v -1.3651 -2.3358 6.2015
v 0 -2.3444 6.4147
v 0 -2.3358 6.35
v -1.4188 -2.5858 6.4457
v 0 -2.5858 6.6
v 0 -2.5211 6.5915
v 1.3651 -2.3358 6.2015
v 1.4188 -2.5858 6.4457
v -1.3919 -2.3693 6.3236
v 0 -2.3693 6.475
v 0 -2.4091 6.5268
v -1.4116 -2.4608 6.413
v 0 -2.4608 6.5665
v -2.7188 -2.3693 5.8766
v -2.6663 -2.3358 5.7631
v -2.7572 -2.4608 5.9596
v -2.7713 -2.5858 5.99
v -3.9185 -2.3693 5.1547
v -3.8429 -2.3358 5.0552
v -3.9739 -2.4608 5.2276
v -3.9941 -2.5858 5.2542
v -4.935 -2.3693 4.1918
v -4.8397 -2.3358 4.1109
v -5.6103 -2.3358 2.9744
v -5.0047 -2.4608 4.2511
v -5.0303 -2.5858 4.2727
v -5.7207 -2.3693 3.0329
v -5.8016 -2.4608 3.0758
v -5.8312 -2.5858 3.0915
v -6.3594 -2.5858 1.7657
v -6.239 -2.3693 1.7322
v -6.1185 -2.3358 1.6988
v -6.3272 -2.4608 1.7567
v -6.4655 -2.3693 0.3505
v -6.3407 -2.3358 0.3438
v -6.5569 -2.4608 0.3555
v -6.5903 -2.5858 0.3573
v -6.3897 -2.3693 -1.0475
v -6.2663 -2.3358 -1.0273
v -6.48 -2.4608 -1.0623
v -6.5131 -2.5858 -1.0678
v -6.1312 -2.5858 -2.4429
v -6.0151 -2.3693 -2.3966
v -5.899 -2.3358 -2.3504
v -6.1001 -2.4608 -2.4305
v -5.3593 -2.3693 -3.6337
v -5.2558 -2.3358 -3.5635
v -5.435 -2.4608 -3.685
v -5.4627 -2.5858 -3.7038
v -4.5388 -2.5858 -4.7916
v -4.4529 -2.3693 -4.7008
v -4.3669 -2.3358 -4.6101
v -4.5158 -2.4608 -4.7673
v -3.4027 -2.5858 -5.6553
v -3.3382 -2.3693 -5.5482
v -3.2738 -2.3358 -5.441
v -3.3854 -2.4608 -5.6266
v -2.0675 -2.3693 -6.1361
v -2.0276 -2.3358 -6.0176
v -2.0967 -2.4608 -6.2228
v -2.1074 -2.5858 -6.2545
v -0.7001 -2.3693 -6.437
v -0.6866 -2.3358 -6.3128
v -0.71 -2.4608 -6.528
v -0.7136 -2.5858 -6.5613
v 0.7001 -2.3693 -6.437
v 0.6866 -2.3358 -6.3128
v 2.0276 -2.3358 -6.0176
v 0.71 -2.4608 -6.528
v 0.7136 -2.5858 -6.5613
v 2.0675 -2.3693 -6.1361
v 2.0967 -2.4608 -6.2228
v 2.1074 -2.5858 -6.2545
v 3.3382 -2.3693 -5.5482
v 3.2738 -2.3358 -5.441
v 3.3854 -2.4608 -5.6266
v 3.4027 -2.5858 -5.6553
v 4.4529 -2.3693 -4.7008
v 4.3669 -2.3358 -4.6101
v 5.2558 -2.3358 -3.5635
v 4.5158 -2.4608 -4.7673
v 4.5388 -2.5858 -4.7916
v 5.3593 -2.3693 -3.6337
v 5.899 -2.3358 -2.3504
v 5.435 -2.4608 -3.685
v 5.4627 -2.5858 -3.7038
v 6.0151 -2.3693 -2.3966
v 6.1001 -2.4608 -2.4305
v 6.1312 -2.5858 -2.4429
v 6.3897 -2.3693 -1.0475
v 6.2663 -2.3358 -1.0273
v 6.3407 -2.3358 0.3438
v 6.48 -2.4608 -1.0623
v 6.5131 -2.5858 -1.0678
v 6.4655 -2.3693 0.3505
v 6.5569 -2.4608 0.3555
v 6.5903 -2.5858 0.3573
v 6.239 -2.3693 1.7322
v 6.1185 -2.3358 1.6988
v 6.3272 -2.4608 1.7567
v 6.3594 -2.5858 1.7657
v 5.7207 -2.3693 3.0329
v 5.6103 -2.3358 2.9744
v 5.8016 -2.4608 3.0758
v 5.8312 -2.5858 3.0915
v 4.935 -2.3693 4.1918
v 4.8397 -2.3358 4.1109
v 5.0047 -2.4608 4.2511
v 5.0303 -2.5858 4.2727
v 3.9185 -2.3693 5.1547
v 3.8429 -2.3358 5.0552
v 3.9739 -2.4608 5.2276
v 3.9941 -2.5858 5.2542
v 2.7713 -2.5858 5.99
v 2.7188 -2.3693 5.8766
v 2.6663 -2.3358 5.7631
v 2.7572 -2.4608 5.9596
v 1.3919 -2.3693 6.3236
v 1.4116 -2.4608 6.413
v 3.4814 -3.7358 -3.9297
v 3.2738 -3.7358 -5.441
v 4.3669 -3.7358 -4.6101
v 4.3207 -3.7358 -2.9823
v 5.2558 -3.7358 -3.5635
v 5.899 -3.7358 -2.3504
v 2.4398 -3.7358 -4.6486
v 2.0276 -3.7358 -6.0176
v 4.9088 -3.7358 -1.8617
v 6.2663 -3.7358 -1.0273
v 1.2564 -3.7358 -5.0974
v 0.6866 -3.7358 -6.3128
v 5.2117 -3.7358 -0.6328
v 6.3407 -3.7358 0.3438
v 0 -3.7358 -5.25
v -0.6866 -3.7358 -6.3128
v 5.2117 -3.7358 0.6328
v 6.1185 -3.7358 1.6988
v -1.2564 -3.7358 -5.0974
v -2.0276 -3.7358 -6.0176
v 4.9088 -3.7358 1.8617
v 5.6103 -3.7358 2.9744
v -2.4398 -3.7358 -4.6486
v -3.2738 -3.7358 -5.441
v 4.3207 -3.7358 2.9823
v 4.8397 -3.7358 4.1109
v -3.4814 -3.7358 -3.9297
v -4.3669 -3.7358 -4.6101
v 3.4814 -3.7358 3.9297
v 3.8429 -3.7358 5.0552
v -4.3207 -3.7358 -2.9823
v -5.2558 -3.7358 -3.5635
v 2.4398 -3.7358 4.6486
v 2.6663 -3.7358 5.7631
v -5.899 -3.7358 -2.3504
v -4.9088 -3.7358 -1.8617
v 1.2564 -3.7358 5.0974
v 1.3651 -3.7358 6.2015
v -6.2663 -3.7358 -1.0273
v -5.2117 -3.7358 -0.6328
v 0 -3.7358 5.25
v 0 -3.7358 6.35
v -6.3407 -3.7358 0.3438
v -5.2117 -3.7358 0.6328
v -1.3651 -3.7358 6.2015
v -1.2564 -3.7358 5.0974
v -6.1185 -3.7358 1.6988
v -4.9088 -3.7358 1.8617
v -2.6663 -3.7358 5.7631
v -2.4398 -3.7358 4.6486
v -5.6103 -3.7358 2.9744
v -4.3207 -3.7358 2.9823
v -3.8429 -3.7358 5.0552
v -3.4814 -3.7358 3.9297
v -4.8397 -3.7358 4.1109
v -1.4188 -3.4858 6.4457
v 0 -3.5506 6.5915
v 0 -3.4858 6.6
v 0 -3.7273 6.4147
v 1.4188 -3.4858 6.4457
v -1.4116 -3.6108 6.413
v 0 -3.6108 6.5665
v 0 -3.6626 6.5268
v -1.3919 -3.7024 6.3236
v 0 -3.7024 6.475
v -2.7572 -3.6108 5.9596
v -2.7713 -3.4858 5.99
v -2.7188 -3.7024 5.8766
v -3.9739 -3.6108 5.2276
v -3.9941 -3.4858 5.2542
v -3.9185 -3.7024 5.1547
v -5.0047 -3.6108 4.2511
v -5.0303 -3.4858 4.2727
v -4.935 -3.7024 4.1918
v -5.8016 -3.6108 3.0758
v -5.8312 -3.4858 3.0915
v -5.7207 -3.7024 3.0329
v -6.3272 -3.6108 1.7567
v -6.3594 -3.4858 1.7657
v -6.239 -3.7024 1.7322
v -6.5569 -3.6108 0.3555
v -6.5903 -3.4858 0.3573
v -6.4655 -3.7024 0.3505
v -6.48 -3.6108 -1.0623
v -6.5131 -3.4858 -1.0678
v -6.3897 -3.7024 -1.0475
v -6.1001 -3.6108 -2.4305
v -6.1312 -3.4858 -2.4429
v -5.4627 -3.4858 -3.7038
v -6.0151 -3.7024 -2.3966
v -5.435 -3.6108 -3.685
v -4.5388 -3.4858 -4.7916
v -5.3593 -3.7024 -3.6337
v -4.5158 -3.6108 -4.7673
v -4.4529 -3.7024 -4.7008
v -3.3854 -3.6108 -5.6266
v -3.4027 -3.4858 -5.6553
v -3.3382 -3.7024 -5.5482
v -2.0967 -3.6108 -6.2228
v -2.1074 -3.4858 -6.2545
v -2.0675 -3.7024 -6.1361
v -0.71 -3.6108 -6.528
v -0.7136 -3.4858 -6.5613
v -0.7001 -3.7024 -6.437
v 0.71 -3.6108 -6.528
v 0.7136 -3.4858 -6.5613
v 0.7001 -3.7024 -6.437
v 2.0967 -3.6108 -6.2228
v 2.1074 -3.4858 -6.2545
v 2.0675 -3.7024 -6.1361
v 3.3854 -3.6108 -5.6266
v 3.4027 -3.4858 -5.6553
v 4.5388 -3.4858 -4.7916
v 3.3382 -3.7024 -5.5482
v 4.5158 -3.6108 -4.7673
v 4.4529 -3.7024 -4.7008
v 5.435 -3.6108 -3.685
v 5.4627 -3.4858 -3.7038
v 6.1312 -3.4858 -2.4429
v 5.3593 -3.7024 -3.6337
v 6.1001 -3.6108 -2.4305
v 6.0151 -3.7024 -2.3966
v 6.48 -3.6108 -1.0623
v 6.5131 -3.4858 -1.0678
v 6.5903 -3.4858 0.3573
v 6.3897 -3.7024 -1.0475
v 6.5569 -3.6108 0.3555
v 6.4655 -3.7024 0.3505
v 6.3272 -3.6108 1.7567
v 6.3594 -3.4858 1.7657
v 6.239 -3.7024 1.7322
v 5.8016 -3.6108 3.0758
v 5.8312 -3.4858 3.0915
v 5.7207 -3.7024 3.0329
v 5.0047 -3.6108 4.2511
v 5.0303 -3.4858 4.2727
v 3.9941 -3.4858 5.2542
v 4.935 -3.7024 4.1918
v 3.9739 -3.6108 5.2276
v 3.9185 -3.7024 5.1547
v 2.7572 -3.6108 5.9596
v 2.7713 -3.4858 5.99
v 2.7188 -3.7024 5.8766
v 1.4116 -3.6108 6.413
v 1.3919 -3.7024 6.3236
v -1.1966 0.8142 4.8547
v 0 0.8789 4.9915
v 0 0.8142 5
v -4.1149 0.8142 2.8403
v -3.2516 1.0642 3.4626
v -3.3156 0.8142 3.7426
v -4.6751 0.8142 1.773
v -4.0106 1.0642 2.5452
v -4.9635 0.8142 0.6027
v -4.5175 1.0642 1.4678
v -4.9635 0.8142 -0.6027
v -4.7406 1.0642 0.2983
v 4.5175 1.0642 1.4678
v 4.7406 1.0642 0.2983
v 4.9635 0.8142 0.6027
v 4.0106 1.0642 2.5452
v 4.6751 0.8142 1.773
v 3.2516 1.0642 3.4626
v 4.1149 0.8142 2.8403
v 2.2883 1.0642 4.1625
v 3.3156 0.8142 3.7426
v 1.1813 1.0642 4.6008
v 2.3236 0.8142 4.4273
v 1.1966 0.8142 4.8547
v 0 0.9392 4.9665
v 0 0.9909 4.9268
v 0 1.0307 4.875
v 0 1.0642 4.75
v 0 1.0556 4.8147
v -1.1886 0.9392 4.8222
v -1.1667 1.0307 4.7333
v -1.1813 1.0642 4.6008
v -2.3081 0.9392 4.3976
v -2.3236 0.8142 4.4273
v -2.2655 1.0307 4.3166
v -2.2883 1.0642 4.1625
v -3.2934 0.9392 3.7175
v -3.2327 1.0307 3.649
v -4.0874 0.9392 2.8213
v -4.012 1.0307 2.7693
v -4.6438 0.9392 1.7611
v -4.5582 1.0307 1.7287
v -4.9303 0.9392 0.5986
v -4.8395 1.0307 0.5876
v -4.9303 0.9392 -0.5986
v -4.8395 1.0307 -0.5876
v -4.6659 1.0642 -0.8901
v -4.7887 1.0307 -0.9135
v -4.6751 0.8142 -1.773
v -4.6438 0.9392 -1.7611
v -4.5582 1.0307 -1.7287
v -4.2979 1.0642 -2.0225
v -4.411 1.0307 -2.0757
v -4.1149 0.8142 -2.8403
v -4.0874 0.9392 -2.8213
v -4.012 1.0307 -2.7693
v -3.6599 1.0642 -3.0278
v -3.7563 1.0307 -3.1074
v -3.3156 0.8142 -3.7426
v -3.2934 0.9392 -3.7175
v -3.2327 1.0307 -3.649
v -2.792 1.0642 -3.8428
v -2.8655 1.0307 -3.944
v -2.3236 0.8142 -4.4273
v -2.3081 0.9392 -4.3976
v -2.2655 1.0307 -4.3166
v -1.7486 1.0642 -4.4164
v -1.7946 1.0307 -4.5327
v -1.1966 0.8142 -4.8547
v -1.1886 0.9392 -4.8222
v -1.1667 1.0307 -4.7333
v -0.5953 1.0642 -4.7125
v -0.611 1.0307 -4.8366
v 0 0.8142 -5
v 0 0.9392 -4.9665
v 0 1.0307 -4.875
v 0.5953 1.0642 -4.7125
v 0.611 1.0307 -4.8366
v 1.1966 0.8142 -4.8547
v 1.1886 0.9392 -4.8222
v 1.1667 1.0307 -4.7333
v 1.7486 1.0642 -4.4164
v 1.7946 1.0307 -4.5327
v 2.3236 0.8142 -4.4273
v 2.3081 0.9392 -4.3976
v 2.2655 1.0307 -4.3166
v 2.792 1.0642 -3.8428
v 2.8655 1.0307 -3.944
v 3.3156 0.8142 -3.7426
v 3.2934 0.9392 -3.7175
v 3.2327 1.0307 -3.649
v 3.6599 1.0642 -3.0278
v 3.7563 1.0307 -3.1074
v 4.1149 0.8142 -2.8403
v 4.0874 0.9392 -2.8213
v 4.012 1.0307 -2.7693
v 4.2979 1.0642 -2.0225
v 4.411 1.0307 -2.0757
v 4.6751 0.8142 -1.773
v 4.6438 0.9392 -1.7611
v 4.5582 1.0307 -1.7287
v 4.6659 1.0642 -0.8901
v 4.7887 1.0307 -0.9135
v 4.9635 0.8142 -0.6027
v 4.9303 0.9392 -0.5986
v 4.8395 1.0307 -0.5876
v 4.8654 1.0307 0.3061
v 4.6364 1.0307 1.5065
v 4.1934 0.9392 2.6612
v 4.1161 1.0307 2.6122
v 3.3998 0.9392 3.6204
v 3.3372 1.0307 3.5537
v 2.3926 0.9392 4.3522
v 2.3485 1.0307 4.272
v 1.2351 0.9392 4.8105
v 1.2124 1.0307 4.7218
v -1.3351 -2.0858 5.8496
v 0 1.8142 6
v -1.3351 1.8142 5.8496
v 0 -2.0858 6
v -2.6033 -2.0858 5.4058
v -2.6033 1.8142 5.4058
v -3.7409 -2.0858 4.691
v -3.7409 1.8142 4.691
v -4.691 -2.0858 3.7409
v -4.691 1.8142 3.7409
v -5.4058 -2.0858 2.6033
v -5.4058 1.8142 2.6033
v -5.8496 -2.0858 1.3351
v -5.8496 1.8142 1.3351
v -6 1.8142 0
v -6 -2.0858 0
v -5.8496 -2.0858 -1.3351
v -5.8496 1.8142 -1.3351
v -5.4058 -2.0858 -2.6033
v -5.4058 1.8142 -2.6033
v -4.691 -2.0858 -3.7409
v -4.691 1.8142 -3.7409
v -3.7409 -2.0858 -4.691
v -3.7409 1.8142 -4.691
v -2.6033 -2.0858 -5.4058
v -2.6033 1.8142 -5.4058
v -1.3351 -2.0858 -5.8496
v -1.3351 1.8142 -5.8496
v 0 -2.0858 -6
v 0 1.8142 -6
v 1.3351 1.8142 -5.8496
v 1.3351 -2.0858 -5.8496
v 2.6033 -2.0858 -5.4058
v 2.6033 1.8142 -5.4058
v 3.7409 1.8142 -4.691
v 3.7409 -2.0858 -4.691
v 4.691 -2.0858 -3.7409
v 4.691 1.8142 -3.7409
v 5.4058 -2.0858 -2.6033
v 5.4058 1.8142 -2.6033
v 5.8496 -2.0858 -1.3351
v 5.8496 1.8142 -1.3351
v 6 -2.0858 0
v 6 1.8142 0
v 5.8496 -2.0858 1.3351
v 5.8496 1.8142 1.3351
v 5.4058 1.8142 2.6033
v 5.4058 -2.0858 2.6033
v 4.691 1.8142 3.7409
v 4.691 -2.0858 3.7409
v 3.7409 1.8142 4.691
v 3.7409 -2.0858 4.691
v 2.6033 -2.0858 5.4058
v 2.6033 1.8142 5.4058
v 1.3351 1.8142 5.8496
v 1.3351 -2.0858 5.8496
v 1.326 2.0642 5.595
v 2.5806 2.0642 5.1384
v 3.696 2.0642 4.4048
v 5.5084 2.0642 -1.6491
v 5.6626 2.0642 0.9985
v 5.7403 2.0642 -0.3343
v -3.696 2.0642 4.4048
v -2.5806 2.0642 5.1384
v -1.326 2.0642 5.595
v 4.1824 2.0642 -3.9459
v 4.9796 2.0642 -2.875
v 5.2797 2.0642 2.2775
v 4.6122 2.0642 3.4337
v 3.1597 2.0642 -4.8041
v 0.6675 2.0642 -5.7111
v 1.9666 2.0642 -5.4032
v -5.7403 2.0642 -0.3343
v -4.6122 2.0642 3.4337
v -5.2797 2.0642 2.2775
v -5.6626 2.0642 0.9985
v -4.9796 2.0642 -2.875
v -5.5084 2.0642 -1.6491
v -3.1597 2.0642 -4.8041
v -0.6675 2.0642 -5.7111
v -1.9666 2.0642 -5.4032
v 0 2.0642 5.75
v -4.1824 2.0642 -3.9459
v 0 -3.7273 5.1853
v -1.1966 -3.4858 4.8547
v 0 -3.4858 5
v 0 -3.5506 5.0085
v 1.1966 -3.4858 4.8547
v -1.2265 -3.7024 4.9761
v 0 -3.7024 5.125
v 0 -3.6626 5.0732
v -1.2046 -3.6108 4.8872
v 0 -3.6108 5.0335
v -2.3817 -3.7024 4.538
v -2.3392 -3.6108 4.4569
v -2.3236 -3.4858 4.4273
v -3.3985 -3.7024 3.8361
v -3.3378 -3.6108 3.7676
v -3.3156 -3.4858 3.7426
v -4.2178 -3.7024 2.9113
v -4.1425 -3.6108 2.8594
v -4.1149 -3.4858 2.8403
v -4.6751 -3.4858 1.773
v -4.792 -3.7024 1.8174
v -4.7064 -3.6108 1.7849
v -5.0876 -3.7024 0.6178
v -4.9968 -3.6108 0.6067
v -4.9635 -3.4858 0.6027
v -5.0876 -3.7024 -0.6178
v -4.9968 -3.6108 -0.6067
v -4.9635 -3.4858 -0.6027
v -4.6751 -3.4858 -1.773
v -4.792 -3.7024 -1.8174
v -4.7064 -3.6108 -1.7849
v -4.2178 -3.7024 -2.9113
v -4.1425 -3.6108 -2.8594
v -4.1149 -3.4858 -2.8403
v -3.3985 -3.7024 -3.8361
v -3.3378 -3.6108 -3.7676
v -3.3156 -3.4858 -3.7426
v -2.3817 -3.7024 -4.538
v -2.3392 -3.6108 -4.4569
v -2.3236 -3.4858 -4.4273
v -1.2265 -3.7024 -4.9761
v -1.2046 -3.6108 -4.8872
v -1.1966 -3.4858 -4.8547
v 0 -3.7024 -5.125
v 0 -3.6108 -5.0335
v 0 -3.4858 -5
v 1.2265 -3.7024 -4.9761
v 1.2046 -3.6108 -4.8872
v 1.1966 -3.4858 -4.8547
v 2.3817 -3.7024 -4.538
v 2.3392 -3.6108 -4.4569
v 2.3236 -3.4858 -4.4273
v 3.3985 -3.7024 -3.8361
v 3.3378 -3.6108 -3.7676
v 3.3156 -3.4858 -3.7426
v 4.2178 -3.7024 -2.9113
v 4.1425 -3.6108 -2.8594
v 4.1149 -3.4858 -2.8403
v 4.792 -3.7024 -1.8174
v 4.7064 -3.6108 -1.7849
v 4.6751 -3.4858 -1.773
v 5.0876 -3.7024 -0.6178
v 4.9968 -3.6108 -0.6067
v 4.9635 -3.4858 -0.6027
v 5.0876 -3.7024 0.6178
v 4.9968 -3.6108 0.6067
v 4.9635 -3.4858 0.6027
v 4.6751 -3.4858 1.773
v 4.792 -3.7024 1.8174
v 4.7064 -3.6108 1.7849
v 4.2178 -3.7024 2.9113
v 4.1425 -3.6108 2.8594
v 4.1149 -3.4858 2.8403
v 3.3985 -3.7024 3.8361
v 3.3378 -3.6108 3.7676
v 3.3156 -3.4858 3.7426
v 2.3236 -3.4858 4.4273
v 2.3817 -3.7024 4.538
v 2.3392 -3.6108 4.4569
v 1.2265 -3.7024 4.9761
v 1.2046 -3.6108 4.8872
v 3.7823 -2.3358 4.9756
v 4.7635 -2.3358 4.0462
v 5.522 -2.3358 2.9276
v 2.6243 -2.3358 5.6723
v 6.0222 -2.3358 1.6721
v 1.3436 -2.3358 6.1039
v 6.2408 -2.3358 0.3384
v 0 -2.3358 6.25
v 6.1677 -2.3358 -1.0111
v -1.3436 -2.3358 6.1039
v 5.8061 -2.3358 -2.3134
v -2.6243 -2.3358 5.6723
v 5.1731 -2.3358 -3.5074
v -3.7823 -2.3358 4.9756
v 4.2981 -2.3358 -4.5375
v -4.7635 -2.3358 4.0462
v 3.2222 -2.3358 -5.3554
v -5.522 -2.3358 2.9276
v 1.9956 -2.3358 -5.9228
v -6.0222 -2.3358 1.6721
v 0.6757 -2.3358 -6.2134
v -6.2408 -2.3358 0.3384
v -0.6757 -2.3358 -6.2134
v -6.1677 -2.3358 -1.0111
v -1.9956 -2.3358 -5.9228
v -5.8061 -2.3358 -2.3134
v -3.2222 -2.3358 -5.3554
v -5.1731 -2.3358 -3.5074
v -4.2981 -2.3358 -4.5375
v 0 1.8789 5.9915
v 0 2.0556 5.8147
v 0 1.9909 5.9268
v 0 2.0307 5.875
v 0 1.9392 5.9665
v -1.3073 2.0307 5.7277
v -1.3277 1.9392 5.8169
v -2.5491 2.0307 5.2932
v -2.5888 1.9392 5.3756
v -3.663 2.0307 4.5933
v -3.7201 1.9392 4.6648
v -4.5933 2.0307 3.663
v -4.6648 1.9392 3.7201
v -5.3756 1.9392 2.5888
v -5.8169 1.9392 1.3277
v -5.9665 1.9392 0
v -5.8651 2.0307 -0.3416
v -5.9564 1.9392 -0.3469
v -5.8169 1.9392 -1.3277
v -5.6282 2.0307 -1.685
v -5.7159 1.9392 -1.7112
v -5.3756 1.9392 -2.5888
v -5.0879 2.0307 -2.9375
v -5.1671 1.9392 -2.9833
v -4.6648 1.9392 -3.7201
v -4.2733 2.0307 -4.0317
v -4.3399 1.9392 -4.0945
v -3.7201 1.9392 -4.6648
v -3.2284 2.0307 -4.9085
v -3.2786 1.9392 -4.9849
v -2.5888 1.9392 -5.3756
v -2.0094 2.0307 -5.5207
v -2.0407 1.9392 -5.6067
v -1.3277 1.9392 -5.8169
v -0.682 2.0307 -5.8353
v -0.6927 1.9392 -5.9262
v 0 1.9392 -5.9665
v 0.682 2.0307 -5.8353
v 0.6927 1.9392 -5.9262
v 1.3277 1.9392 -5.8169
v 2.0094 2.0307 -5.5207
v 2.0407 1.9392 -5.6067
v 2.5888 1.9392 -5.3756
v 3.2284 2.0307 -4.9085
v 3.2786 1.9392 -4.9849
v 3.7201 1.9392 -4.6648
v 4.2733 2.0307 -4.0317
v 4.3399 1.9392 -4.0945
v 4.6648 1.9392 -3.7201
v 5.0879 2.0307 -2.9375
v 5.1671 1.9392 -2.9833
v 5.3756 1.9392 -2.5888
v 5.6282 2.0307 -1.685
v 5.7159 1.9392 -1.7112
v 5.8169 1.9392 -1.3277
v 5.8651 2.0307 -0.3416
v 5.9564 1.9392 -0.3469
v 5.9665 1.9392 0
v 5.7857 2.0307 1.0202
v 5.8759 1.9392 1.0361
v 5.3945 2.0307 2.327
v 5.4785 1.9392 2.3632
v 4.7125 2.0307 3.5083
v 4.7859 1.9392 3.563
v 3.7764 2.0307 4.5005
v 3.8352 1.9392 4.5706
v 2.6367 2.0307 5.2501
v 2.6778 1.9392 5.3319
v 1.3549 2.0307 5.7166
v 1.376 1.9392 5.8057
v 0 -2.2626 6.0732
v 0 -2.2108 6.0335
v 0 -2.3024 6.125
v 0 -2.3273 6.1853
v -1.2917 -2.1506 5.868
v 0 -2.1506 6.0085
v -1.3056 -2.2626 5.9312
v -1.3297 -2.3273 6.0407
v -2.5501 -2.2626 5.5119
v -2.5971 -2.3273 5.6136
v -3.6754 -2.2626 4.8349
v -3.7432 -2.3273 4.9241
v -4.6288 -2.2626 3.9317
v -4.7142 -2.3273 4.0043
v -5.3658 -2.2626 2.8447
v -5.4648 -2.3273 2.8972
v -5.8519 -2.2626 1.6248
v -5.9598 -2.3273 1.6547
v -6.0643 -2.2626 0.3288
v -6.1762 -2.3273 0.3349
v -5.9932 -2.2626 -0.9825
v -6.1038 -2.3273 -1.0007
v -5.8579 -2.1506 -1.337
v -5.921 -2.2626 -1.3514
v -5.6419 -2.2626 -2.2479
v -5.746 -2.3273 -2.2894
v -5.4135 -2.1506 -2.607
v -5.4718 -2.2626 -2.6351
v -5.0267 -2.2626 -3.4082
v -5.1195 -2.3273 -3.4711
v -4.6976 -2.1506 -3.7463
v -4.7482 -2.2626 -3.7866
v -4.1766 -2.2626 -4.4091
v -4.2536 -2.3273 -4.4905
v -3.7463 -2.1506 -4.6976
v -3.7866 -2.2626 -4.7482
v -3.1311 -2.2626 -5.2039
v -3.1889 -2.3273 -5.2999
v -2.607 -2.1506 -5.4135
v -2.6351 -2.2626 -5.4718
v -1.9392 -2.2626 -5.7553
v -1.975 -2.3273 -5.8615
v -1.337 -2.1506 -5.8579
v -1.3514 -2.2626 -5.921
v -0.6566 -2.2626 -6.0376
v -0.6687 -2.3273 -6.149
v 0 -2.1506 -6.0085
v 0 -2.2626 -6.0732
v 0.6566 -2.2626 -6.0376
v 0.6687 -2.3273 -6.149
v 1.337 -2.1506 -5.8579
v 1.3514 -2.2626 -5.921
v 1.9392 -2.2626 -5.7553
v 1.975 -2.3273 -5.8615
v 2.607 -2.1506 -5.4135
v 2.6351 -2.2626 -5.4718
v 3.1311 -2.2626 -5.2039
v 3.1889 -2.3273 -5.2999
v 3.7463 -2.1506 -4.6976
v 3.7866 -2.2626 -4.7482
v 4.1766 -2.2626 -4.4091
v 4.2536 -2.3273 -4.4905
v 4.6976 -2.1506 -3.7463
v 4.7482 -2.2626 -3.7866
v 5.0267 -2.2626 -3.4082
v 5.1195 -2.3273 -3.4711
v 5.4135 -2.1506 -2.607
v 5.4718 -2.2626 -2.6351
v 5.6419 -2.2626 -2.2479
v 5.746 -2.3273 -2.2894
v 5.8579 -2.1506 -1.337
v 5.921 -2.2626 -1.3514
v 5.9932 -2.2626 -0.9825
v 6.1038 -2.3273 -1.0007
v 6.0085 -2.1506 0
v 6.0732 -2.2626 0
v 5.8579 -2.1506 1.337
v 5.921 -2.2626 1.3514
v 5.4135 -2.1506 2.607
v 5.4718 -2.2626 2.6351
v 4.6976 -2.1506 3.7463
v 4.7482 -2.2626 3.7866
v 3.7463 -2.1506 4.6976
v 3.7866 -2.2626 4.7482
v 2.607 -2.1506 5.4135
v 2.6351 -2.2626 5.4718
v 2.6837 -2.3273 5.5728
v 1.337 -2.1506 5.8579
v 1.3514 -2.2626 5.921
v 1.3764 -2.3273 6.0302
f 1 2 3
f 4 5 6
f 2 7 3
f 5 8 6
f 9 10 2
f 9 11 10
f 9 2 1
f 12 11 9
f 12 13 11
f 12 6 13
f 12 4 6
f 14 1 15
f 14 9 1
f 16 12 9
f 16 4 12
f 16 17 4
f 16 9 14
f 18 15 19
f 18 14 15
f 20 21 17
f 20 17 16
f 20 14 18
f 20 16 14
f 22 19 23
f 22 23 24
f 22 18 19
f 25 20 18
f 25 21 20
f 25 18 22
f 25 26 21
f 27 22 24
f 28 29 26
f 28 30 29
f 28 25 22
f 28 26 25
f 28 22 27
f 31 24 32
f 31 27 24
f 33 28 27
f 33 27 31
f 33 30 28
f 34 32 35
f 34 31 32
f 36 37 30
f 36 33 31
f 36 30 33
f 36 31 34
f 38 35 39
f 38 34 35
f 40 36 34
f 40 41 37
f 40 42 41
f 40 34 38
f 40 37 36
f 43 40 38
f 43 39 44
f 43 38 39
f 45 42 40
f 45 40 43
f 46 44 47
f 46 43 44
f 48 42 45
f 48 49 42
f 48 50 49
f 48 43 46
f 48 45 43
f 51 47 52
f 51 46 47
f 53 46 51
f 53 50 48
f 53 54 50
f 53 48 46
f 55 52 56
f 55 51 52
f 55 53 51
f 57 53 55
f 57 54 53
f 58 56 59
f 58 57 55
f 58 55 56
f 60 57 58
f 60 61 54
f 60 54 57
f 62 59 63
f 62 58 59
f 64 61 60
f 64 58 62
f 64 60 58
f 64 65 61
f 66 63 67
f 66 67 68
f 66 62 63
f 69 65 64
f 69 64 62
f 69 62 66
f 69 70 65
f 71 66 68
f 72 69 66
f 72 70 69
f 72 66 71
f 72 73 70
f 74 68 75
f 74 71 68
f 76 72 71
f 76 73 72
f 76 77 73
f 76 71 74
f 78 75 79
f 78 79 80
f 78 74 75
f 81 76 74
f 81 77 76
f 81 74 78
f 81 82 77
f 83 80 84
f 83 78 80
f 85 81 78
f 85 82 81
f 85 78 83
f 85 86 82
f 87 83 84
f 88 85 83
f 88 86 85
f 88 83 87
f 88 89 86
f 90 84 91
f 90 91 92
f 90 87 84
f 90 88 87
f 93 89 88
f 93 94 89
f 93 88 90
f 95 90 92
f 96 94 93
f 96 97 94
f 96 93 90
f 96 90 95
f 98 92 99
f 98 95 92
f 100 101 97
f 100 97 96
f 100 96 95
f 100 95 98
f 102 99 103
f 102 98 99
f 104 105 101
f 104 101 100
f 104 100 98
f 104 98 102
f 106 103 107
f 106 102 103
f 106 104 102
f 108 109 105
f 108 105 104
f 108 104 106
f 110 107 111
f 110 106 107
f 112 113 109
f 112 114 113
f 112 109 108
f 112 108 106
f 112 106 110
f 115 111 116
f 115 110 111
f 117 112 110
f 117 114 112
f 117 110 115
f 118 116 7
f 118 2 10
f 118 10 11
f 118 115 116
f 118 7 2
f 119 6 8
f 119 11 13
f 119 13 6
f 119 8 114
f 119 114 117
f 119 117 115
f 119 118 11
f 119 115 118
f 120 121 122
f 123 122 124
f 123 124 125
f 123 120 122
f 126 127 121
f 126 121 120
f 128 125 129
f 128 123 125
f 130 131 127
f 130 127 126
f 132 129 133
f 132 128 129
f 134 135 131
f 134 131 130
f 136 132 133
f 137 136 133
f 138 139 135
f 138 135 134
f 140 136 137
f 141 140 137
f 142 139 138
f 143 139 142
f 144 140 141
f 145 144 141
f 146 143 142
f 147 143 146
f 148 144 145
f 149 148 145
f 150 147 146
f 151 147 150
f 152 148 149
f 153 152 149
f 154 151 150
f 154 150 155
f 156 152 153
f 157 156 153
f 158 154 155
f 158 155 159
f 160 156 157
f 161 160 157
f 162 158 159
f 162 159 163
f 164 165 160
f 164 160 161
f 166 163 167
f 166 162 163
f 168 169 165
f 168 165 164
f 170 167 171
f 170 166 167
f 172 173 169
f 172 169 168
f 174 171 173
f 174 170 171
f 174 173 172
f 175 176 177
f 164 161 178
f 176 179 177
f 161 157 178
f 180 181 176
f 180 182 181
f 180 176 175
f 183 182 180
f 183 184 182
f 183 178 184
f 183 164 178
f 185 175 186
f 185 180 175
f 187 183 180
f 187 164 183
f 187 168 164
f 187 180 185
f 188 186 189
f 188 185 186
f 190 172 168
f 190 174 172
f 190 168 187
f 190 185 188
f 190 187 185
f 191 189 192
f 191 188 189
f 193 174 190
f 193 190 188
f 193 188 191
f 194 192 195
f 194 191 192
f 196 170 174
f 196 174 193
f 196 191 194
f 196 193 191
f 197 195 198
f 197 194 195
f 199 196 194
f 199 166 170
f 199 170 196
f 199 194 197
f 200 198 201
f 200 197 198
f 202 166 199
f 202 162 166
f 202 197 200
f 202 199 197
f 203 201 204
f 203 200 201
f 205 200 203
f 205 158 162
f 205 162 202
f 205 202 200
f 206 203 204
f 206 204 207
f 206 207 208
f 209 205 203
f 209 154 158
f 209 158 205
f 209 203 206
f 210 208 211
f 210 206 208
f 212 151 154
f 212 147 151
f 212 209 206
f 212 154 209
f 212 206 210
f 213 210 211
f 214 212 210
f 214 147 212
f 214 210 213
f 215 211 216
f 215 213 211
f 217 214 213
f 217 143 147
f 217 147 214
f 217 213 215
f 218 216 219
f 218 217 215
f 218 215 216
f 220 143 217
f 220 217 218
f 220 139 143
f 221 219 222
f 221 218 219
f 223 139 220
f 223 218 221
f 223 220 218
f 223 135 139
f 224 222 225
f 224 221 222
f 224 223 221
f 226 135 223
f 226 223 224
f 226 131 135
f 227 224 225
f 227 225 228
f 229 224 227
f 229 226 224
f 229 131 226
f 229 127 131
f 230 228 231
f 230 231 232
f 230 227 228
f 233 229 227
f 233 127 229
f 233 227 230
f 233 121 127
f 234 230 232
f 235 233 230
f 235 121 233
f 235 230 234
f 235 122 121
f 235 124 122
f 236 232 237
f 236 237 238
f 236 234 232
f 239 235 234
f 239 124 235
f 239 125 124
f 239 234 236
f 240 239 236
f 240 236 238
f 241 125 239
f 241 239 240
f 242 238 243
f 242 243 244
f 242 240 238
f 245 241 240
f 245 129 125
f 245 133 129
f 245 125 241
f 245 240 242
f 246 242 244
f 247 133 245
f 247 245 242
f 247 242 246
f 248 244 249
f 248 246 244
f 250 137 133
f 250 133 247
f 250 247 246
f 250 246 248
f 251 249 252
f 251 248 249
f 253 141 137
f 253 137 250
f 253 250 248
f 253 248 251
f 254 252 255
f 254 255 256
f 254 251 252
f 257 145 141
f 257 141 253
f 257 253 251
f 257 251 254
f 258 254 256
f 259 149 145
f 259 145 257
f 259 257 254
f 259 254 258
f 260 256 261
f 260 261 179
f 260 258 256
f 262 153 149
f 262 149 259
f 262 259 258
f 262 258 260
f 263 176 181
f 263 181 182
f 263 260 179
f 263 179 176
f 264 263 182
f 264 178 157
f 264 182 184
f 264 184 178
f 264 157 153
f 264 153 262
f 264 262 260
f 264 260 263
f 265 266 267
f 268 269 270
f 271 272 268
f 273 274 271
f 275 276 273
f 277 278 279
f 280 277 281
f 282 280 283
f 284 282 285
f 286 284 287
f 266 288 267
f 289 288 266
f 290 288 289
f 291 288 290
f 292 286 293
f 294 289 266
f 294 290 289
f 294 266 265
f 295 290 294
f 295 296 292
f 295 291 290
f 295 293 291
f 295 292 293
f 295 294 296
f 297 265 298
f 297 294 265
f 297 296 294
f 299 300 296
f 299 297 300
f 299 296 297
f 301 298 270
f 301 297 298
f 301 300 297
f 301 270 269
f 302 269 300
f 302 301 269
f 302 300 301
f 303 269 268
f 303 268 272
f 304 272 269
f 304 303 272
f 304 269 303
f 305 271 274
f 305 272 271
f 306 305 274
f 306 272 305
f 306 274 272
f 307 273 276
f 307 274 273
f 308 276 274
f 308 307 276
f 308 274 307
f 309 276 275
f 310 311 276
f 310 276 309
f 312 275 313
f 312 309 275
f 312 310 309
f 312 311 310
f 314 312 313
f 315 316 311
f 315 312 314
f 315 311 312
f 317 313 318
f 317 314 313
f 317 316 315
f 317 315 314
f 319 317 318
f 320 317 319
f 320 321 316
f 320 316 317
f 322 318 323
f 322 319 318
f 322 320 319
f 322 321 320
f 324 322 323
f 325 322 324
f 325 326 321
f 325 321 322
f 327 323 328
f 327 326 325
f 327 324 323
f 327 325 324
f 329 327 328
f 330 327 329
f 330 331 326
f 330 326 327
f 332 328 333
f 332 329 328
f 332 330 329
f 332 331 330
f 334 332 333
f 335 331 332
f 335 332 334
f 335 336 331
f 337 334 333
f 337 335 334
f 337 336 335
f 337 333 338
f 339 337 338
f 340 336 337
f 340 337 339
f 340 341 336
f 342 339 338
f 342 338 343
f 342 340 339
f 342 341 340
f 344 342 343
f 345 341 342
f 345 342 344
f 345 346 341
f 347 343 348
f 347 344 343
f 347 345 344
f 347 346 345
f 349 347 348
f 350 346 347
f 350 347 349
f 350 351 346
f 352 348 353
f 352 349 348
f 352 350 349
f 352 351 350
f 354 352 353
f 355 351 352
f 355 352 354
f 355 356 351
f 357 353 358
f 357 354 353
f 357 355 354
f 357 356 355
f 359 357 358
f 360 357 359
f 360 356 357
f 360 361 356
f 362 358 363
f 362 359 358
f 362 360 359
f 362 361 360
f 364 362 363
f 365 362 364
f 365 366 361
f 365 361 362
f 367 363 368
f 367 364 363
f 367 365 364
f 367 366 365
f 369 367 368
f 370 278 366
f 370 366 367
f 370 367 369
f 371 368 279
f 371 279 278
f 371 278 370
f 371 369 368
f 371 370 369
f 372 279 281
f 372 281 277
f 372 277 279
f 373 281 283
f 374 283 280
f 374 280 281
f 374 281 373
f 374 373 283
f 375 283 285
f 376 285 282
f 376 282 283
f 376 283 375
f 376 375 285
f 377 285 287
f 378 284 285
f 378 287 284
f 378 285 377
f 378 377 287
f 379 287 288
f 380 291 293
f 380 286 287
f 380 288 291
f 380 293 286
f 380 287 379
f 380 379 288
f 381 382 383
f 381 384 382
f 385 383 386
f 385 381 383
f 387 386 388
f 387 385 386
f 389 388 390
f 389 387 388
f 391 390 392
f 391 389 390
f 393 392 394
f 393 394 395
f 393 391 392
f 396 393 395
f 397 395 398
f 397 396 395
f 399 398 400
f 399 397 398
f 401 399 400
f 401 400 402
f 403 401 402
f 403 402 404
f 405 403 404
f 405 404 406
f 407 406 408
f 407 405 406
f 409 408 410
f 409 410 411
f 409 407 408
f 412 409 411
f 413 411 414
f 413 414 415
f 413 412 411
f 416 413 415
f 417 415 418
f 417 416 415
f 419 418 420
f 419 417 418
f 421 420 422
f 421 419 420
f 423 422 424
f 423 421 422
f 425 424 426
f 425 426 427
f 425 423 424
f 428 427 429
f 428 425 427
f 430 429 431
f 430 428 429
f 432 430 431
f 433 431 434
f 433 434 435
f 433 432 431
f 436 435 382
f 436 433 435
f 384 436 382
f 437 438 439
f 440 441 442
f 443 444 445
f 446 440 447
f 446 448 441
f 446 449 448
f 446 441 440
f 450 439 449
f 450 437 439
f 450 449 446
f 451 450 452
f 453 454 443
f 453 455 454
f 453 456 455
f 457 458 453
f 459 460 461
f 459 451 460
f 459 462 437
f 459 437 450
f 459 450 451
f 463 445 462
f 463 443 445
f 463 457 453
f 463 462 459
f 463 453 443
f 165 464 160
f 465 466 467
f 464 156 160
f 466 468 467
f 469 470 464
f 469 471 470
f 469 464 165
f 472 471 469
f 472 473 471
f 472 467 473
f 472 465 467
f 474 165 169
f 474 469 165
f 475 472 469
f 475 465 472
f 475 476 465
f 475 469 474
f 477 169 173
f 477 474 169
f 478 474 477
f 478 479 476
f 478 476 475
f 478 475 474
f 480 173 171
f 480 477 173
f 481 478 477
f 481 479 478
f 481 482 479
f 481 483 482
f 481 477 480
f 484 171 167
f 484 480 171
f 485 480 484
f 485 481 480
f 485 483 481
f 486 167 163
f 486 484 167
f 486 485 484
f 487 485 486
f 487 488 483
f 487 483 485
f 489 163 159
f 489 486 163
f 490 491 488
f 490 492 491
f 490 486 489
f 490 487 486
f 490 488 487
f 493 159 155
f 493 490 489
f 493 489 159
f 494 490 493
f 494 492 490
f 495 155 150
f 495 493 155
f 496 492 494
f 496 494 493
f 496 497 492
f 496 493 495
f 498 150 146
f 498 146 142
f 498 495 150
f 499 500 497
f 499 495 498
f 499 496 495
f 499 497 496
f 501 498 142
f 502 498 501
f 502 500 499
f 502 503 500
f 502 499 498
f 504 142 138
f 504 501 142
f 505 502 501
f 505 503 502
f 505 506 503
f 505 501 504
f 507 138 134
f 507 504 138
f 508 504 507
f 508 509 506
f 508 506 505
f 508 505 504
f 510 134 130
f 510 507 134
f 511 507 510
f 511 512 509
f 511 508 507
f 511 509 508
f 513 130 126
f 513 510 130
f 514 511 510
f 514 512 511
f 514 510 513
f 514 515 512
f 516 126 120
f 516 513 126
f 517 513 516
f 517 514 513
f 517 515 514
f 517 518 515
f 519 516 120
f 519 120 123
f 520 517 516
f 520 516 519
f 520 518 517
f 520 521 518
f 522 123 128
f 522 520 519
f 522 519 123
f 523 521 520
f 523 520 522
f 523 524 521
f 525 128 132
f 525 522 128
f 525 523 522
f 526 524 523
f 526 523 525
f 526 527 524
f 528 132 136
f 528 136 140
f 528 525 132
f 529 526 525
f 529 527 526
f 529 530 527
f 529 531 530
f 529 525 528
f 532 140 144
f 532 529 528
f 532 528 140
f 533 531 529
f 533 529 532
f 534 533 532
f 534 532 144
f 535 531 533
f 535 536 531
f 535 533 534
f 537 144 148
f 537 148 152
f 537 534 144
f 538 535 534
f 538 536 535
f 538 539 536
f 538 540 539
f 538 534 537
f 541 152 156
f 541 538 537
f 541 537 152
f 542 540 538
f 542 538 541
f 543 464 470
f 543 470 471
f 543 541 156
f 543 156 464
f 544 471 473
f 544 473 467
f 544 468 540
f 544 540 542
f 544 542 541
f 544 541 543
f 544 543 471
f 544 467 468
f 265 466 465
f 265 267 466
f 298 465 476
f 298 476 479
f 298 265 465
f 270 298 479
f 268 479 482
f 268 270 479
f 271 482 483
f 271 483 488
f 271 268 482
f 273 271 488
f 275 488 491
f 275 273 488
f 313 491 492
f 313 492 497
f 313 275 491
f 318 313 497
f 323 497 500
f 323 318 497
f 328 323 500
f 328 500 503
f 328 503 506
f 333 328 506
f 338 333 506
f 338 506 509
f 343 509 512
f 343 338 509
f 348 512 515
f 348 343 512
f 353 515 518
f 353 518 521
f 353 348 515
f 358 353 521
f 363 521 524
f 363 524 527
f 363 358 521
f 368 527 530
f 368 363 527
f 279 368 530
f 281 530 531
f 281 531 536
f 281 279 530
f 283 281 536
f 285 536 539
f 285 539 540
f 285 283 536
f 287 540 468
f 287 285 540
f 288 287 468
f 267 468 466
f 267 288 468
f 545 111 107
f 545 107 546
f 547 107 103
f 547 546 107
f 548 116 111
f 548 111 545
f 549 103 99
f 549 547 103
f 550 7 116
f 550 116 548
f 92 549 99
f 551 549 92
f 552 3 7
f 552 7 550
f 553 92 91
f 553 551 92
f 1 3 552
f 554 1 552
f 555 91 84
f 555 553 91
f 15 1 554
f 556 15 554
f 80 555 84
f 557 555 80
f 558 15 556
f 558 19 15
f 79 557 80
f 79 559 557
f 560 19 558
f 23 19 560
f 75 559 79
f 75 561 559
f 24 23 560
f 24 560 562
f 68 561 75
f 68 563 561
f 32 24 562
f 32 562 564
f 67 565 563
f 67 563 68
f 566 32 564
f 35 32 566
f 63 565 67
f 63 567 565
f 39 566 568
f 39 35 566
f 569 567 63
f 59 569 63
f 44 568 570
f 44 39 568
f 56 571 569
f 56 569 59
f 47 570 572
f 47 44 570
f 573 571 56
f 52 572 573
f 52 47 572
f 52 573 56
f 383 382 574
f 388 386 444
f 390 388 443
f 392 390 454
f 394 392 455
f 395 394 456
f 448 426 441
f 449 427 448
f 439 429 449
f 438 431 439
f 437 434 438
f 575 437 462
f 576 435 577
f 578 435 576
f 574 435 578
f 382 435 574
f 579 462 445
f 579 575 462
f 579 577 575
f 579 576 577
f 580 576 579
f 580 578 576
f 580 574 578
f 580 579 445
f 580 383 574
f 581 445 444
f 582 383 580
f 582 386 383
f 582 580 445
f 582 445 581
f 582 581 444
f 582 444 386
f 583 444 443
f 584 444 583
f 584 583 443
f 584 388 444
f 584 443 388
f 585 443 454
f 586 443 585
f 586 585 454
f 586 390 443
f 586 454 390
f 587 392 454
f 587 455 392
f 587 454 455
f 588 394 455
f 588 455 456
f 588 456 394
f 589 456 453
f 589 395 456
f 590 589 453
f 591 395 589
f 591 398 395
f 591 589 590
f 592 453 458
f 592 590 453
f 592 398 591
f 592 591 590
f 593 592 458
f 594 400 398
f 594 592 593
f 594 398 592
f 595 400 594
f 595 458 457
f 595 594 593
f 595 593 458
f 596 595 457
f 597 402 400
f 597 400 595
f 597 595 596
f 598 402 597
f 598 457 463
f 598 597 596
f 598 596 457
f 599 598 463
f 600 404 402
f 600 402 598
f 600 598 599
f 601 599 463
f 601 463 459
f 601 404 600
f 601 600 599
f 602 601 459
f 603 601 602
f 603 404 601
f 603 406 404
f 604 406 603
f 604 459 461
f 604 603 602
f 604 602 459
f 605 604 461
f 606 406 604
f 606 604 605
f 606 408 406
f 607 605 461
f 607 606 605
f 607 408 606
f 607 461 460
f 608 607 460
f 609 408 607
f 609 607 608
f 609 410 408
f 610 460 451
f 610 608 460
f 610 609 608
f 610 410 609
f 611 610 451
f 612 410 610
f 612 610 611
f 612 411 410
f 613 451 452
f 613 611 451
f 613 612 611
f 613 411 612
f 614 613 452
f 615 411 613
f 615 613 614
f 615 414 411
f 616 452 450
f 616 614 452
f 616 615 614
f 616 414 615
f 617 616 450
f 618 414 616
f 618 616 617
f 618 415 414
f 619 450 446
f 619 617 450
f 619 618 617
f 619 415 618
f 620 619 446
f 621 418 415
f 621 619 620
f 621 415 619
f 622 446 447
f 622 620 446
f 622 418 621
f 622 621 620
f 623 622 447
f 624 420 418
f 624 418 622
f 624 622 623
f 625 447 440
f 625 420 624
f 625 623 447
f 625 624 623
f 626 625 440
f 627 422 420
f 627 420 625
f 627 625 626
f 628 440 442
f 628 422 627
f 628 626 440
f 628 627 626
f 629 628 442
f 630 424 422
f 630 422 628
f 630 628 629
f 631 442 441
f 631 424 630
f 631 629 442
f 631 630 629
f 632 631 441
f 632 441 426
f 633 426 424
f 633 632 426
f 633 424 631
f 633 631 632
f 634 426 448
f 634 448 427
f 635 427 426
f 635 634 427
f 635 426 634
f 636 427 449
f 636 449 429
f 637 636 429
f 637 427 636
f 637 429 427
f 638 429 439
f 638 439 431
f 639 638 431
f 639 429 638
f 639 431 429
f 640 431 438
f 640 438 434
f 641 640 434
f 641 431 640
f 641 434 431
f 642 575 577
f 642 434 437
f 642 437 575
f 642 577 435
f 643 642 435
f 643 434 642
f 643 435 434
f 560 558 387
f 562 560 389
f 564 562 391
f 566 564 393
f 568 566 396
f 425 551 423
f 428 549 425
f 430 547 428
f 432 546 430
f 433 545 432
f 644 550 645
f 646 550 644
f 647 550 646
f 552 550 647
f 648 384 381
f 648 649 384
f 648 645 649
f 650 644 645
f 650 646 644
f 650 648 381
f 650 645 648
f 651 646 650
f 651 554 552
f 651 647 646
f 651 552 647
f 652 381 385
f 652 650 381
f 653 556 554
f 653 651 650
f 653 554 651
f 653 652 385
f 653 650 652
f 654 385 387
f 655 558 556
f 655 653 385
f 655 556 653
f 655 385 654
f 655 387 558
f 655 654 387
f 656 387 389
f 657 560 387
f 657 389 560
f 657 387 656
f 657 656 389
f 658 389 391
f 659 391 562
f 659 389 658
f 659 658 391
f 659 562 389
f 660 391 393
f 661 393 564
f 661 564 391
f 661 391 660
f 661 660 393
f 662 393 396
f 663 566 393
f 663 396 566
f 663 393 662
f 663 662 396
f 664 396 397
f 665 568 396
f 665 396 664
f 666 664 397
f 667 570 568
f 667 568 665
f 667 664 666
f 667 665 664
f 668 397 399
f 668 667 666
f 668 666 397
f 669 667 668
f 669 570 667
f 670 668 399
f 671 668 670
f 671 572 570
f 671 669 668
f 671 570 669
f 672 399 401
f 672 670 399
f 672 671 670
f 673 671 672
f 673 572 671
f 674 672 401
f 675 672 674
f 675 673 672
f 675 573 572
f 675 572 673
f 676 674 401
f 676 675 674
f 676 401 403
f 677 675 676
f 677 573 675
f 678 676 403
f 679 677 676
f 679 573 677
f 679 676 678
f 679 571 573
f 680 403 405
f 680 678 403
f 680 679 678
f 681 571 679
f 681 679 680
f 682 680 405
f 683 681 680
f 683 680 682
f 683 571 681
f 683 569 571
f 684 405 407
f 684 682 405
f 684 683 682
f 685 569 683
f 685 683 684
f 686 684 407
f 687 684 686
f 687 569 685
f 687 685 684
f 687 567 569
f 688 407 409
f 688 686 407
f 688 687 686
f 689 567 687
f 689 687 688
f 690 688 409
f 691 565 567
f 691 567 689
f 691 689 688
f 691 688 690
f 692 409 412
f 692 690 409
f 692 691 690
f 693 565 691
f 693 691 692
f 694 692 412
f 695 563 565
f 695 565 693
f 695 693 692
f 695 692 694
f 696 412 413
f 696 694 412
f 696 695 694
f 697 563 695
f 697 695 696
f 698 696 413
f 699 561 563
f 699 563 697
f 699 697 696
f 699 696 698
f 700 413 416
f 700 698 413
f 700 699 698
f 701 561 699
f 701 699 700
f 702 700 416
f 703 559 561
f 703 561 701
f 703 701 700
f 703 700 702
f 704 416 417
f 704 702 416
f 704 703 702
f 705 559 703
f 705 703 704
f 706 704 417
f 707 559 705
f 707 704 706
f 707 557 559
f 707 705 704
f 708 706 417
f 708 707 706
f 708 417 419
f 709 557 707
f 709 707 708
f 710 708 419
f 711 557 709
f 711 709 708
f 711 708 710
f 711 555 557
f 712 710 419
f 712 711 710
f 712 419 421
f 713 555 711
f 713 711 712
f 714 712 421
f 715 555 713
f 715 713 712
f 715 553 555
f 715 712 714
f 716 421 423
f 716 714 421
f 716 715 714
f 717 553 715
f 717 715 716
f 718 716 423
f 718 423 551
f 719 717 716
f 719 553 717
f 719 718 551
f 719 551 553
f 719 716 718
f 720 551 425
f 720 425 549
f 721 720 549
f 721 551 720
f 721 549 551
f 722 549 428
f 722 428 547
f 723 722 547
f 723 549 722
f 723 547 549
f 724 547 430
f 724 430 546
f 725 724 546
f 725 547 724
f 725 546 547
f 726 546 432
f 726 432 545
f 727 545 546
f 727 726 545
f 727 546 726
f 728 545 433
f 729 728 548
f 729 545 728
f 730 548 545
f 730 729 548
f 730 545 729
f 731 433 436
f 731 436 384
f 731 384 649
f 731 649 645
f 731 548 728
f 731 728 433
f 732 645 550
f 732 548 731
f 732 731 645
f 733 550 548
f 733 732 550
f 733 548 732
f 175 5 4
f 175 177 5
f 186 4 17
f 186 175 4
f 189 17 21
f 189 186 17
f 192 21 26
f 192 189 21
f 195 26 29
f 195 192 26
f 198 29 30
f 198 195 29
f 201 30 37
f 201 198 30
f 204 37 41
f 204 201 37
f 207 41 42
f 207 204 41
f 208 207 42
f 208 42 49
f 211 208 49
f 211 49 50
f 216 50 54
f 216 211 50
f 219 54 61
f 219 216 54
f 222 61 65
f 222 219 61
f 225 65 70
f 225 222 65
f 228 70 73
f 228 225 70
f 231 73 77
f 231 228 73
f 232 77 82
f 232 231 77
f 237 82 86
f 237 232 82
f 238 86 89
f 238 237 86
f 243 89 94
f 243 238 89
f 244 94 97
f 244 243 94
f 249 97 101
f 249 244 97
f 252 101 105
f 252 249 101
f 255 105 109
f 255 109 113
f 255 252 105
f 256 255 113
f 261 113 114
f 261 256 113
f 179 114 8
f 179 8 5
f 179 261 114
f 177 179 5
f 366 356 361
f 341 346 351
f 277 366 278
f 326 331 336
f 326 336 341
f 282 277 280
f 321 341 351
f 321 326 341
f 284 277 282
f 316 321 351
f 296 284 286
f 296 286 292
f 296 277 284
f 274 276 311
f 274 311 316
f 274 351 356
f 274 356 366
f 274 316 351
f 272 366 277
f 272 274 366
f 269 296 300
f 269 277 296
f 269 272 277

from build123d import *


with BuildPart() as part:
    # Sketch1 → Revolve1 (revolve)
    with BuildSketch(Plane(origin=(0, 0, 0), x_dir=(0, 0, -1), z_dir=(1, 0, 0))):
        with BuildLine():
            Line((0, 2.064150943), (-5.75, 2.064150943))
            ThreePointArc((-5.75, 2.064150943), (-5.926776695, 1.990927639), (-6, 1.814150943))
            Line((-6, 1.814150943), (-6, -2.085849057))
            ThreePointArc((-6, -2.085849057), (-6.073223305, -2.262625752), (-6.25, -2.335849057))
            Line((-6.25, -2.335849057), (-6.35, -2.335849057))
            ThreePointArc((-6.35, -2.335849057), (-6.526776695, -2.409072361), (-6.6, -2.585849057))
            Line((-6.6, -2.585849057), (-6.6, -3.485849057))
            ThreePointArc((-6.6, -3.485849057), (-6.526776695, -3.662625752), (-6.35, -3.735849057))
            Line((-6.35, -3.735849057), (-5.25, -3.735849057))
            ThreePointArc((-5.25, -3.735849057), (-5.073223305, -3.662625752), (-5, -3.485849057))
            Line((-5, -3.485849057), (-5, 0.814150943))
            ThreePointArc((-5, 0.814150943), (-4.926776695, 0.990927639), (-4.75, 1.064150943))
            Line((-4.75, 1.064150943), (0, 1.064150943))
            Line((0, 1.064150943), (0, 2.064150943))
        make_face()
    revolve(axis=Axis((0, 13.867924528, 0), (0, -1, 0)))


solid = part.part
